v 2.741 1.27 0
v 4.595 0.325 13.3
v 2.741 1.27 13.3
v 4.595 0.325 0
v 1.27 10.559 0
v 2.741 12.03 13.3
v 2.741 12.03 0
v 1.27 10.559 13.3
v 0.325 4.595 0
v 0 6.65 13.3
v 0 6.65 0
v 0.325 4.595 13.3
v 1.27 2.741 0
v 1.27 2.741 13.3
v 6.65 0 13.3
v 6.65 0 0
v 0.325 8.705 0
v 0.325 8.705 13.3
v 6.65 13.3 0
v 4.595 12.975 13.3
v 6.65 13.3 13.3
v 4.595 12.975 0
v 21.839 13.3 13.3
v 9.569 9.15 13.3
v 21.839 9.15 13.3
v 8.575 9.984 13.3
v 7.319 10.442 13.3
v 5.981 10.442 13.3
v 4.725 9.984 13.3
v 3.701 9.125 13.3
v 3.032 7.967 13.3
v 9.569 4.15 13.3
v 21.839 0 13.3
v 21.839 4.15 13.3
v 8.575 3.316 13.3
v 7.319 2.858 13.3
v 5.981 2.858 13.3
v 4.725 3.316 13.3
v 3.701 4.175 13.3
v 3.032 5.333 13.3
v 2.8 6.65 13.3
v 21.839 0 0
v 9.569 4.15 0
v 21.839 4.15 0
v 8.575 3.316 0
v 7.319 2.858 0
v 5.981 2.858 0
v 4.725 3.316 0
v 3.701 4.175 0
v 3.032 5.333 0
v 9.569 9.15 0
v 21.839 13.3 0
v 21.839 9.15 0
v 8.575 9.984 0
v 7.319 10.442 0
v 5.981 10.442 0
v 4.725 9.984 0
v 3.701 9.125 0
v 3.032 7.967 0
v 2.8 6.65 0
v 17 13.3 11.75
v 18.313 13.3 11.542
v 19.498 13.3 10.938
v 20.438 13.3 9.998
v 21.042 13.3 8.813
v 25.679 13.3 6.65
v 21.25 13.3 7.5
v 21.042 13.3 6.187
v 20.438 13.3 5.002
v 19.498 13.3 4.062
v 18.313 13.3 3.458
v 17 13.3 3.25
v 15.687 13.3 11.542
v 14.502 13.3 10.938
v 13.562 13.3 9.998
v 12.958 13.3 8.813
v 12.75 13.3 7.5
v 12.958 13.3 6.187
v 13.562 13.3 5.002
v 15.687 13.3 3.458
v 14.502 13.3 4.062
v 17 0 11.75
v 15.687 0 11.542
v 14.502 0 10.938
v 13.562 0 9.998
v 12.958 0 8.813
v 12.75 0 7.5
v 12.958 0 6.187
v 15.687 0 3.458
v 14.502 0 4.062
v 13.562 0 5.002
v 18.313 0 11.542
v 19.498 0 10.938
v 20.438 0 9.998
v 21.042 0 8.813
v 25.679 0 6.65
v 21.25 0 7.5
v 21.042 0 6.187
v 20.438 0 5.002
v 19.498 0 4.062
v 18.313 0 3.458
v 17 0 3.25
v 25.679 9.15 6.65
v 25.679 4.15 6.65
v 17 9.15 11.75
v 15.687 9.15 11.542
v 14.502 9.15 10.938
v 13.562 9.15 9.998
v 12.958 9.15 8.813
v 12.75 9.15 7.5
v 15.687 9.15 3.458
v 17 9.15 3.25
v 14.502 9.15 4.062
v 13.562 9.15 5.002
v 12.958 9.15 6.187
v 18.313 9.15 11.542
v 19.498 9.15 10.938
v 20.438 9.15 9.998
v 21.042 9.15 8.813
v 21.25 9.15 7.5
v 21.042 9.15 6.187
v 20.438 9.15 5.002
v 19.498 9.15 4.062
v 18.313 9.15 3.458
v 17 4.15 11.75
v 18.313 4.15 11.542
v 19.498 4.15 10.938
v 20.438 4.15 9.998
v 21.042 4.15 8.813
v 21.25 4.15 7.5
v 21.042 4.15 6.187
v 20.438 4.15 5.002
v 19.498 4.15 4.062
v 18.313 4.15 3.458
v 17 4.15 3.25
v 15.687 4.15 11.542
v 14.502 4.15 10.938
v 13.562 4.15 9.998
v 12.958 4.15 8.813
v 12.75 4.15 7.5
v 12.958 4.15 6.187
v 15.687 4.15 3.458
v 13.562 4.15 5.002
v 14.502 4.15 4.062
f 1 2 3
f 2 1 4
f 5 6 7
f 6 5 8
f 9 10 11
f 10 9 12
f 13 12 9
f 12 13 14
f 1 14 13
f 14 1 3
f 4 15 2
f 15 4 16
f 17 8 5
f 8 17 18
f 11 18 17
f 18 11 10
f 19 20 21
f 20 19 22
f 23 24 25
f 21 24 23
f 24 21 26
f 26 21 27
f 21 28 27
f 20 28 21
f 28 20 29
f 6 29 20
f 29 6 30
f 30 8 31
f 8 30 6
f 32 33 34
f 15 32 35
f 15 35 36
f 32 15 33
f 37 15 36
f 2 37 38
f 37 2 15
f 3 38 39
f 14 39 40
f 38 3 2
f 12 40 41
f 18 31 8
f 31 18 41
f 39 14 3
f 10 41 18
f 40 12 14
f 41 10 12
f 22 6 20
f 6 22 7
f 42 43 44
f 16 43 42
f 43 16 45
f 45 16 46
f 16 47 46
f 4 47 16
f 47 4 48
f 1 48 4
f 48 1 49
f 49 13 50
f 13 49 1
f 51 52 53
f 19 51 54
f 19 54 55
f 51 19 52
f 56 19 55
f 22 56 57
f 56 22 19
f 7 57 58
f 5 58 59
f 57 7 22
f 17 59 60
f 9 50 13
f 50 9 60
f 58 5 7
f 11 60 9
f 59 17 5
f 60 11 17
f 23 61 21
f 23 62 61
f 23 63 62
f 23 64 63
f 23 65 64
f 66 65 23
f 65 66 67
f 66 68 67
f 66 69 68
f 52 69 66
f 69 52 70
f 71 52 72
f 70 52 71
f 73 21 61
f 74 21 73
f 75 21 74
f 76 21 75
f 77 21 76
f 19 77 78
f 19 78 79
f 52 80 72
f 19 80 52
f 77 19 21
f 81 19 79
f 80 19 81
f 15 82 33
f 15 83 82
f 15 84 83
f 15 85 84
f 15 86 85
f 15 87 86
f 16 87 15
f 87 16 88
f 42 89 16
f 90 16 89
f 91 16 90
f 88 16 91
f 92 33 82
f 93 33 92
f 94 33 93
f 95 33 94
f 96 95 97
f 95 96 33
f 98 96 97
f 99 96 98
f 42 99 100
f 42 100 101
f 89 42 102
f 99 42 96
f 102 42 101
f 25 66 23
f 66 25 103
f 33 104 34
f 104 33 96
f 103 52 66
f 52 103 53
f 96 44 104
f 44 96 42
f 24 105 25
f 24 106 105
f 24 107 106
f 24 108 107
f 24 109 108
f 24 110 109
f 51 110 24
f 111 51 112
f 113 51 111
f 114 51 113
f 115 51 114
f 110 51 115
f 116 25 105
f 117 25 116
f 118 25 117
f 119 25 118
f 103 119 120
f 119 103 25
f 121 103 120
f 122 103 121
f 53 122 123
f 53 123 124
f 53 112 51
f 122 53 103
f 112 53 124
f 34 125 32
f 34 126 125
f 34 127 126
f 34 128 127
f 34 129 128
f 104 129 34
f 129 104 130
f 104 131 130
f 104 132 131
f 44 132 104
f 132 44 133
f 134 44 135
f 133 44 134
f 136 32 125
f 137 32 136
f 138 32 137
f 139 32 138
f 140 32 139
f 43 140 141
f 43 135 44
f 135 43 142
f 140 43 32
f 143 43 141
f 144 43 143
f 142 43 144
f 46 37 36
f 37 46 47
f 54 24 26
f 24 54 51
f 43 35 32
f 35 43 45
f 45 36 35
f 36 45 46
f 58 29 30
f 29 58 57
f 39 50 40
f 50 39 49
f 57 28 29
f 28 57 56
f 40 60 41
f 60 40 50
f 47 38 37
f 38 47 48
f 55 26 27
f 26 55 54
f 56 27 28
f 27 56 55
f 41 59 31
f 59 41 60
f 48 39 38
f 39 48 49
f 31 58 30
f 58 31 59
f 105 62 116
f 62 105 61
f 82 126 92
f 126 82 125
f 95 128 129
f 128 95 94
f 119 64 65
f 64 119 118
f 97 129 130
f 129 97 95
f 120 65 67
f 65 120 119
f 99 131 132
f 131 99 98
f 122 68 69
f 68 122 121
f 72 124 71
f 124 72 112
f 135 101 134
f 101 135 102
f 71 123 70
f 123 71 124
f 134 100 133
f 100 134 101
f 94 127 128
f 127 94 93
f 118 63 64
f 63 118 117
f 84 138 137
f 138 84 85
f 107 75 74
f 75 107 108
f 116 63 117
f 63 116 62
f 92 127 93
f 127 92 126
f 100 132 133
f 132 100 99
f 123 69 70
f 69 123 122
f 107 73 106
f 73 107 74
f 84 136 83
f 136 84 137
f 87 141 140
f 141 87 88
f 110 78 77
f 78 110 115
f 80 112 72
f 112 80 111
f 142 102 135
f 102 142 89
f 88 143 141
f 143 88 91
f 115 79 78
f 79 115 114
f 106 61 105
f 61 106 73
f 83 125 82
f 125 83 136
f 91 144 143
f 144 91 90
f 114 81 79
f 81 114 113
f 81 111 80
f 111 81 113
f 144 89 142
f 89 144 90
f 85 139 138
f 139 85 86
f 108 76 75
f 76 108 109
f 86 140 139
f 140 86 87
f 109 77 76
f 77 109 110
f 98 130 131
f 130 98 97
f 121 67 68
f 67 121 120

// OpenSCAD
threaded_rod_diameter = 8.5;
outer_diameter = (threaded_rod_diameter-0.0)/2+2.4;
module nut(d,h,horizontal=true){
cornerdiameter =  (d / 2) / cos (180 / 6);
cylinder(h = h, r = cornerdiameter, $fn = 6);
if(horizontal){
for(i = [1:6]){
	rotate([0,0,60*i]) translate([-cornerdiameter-0.2,0,0]) rotate([0,0,-45]) cube(size = [2,2,h]);
}}
}

module barclamp(){


difference(){
	union(){
		
		translate([outer_diameter, outer_diameter, 0])cylinder(h =outer_diameter*2, r = outer_diameter, $fn = 20);
		translate([outer_diameter, 0, 0])cube([outer_diameter+1.5,outer_diameter*2,outer_diameter*2]);
		translate([18, 2*outer_diameter, outer_diameter])rotate([90, 0, 0]) rotate([00, 0, 0]) nut(outer_diameter*2,outer_diameter*2,false);
	}


	translate([18, outer_diameter, 9])cube([18,05,20], center=true);
	translate([outer_diameter, outer_diameter, -1]) #cylinder(h =20, r = threaded_rod_diameter/2-0.4, $fn = 18);
	translate([17, 17, 7.5]) rotate([90, 0, 0]) #cylinder(h =20, r = threaded_rod_diameter/2, $fn = 20);
}
}

barclamp();
